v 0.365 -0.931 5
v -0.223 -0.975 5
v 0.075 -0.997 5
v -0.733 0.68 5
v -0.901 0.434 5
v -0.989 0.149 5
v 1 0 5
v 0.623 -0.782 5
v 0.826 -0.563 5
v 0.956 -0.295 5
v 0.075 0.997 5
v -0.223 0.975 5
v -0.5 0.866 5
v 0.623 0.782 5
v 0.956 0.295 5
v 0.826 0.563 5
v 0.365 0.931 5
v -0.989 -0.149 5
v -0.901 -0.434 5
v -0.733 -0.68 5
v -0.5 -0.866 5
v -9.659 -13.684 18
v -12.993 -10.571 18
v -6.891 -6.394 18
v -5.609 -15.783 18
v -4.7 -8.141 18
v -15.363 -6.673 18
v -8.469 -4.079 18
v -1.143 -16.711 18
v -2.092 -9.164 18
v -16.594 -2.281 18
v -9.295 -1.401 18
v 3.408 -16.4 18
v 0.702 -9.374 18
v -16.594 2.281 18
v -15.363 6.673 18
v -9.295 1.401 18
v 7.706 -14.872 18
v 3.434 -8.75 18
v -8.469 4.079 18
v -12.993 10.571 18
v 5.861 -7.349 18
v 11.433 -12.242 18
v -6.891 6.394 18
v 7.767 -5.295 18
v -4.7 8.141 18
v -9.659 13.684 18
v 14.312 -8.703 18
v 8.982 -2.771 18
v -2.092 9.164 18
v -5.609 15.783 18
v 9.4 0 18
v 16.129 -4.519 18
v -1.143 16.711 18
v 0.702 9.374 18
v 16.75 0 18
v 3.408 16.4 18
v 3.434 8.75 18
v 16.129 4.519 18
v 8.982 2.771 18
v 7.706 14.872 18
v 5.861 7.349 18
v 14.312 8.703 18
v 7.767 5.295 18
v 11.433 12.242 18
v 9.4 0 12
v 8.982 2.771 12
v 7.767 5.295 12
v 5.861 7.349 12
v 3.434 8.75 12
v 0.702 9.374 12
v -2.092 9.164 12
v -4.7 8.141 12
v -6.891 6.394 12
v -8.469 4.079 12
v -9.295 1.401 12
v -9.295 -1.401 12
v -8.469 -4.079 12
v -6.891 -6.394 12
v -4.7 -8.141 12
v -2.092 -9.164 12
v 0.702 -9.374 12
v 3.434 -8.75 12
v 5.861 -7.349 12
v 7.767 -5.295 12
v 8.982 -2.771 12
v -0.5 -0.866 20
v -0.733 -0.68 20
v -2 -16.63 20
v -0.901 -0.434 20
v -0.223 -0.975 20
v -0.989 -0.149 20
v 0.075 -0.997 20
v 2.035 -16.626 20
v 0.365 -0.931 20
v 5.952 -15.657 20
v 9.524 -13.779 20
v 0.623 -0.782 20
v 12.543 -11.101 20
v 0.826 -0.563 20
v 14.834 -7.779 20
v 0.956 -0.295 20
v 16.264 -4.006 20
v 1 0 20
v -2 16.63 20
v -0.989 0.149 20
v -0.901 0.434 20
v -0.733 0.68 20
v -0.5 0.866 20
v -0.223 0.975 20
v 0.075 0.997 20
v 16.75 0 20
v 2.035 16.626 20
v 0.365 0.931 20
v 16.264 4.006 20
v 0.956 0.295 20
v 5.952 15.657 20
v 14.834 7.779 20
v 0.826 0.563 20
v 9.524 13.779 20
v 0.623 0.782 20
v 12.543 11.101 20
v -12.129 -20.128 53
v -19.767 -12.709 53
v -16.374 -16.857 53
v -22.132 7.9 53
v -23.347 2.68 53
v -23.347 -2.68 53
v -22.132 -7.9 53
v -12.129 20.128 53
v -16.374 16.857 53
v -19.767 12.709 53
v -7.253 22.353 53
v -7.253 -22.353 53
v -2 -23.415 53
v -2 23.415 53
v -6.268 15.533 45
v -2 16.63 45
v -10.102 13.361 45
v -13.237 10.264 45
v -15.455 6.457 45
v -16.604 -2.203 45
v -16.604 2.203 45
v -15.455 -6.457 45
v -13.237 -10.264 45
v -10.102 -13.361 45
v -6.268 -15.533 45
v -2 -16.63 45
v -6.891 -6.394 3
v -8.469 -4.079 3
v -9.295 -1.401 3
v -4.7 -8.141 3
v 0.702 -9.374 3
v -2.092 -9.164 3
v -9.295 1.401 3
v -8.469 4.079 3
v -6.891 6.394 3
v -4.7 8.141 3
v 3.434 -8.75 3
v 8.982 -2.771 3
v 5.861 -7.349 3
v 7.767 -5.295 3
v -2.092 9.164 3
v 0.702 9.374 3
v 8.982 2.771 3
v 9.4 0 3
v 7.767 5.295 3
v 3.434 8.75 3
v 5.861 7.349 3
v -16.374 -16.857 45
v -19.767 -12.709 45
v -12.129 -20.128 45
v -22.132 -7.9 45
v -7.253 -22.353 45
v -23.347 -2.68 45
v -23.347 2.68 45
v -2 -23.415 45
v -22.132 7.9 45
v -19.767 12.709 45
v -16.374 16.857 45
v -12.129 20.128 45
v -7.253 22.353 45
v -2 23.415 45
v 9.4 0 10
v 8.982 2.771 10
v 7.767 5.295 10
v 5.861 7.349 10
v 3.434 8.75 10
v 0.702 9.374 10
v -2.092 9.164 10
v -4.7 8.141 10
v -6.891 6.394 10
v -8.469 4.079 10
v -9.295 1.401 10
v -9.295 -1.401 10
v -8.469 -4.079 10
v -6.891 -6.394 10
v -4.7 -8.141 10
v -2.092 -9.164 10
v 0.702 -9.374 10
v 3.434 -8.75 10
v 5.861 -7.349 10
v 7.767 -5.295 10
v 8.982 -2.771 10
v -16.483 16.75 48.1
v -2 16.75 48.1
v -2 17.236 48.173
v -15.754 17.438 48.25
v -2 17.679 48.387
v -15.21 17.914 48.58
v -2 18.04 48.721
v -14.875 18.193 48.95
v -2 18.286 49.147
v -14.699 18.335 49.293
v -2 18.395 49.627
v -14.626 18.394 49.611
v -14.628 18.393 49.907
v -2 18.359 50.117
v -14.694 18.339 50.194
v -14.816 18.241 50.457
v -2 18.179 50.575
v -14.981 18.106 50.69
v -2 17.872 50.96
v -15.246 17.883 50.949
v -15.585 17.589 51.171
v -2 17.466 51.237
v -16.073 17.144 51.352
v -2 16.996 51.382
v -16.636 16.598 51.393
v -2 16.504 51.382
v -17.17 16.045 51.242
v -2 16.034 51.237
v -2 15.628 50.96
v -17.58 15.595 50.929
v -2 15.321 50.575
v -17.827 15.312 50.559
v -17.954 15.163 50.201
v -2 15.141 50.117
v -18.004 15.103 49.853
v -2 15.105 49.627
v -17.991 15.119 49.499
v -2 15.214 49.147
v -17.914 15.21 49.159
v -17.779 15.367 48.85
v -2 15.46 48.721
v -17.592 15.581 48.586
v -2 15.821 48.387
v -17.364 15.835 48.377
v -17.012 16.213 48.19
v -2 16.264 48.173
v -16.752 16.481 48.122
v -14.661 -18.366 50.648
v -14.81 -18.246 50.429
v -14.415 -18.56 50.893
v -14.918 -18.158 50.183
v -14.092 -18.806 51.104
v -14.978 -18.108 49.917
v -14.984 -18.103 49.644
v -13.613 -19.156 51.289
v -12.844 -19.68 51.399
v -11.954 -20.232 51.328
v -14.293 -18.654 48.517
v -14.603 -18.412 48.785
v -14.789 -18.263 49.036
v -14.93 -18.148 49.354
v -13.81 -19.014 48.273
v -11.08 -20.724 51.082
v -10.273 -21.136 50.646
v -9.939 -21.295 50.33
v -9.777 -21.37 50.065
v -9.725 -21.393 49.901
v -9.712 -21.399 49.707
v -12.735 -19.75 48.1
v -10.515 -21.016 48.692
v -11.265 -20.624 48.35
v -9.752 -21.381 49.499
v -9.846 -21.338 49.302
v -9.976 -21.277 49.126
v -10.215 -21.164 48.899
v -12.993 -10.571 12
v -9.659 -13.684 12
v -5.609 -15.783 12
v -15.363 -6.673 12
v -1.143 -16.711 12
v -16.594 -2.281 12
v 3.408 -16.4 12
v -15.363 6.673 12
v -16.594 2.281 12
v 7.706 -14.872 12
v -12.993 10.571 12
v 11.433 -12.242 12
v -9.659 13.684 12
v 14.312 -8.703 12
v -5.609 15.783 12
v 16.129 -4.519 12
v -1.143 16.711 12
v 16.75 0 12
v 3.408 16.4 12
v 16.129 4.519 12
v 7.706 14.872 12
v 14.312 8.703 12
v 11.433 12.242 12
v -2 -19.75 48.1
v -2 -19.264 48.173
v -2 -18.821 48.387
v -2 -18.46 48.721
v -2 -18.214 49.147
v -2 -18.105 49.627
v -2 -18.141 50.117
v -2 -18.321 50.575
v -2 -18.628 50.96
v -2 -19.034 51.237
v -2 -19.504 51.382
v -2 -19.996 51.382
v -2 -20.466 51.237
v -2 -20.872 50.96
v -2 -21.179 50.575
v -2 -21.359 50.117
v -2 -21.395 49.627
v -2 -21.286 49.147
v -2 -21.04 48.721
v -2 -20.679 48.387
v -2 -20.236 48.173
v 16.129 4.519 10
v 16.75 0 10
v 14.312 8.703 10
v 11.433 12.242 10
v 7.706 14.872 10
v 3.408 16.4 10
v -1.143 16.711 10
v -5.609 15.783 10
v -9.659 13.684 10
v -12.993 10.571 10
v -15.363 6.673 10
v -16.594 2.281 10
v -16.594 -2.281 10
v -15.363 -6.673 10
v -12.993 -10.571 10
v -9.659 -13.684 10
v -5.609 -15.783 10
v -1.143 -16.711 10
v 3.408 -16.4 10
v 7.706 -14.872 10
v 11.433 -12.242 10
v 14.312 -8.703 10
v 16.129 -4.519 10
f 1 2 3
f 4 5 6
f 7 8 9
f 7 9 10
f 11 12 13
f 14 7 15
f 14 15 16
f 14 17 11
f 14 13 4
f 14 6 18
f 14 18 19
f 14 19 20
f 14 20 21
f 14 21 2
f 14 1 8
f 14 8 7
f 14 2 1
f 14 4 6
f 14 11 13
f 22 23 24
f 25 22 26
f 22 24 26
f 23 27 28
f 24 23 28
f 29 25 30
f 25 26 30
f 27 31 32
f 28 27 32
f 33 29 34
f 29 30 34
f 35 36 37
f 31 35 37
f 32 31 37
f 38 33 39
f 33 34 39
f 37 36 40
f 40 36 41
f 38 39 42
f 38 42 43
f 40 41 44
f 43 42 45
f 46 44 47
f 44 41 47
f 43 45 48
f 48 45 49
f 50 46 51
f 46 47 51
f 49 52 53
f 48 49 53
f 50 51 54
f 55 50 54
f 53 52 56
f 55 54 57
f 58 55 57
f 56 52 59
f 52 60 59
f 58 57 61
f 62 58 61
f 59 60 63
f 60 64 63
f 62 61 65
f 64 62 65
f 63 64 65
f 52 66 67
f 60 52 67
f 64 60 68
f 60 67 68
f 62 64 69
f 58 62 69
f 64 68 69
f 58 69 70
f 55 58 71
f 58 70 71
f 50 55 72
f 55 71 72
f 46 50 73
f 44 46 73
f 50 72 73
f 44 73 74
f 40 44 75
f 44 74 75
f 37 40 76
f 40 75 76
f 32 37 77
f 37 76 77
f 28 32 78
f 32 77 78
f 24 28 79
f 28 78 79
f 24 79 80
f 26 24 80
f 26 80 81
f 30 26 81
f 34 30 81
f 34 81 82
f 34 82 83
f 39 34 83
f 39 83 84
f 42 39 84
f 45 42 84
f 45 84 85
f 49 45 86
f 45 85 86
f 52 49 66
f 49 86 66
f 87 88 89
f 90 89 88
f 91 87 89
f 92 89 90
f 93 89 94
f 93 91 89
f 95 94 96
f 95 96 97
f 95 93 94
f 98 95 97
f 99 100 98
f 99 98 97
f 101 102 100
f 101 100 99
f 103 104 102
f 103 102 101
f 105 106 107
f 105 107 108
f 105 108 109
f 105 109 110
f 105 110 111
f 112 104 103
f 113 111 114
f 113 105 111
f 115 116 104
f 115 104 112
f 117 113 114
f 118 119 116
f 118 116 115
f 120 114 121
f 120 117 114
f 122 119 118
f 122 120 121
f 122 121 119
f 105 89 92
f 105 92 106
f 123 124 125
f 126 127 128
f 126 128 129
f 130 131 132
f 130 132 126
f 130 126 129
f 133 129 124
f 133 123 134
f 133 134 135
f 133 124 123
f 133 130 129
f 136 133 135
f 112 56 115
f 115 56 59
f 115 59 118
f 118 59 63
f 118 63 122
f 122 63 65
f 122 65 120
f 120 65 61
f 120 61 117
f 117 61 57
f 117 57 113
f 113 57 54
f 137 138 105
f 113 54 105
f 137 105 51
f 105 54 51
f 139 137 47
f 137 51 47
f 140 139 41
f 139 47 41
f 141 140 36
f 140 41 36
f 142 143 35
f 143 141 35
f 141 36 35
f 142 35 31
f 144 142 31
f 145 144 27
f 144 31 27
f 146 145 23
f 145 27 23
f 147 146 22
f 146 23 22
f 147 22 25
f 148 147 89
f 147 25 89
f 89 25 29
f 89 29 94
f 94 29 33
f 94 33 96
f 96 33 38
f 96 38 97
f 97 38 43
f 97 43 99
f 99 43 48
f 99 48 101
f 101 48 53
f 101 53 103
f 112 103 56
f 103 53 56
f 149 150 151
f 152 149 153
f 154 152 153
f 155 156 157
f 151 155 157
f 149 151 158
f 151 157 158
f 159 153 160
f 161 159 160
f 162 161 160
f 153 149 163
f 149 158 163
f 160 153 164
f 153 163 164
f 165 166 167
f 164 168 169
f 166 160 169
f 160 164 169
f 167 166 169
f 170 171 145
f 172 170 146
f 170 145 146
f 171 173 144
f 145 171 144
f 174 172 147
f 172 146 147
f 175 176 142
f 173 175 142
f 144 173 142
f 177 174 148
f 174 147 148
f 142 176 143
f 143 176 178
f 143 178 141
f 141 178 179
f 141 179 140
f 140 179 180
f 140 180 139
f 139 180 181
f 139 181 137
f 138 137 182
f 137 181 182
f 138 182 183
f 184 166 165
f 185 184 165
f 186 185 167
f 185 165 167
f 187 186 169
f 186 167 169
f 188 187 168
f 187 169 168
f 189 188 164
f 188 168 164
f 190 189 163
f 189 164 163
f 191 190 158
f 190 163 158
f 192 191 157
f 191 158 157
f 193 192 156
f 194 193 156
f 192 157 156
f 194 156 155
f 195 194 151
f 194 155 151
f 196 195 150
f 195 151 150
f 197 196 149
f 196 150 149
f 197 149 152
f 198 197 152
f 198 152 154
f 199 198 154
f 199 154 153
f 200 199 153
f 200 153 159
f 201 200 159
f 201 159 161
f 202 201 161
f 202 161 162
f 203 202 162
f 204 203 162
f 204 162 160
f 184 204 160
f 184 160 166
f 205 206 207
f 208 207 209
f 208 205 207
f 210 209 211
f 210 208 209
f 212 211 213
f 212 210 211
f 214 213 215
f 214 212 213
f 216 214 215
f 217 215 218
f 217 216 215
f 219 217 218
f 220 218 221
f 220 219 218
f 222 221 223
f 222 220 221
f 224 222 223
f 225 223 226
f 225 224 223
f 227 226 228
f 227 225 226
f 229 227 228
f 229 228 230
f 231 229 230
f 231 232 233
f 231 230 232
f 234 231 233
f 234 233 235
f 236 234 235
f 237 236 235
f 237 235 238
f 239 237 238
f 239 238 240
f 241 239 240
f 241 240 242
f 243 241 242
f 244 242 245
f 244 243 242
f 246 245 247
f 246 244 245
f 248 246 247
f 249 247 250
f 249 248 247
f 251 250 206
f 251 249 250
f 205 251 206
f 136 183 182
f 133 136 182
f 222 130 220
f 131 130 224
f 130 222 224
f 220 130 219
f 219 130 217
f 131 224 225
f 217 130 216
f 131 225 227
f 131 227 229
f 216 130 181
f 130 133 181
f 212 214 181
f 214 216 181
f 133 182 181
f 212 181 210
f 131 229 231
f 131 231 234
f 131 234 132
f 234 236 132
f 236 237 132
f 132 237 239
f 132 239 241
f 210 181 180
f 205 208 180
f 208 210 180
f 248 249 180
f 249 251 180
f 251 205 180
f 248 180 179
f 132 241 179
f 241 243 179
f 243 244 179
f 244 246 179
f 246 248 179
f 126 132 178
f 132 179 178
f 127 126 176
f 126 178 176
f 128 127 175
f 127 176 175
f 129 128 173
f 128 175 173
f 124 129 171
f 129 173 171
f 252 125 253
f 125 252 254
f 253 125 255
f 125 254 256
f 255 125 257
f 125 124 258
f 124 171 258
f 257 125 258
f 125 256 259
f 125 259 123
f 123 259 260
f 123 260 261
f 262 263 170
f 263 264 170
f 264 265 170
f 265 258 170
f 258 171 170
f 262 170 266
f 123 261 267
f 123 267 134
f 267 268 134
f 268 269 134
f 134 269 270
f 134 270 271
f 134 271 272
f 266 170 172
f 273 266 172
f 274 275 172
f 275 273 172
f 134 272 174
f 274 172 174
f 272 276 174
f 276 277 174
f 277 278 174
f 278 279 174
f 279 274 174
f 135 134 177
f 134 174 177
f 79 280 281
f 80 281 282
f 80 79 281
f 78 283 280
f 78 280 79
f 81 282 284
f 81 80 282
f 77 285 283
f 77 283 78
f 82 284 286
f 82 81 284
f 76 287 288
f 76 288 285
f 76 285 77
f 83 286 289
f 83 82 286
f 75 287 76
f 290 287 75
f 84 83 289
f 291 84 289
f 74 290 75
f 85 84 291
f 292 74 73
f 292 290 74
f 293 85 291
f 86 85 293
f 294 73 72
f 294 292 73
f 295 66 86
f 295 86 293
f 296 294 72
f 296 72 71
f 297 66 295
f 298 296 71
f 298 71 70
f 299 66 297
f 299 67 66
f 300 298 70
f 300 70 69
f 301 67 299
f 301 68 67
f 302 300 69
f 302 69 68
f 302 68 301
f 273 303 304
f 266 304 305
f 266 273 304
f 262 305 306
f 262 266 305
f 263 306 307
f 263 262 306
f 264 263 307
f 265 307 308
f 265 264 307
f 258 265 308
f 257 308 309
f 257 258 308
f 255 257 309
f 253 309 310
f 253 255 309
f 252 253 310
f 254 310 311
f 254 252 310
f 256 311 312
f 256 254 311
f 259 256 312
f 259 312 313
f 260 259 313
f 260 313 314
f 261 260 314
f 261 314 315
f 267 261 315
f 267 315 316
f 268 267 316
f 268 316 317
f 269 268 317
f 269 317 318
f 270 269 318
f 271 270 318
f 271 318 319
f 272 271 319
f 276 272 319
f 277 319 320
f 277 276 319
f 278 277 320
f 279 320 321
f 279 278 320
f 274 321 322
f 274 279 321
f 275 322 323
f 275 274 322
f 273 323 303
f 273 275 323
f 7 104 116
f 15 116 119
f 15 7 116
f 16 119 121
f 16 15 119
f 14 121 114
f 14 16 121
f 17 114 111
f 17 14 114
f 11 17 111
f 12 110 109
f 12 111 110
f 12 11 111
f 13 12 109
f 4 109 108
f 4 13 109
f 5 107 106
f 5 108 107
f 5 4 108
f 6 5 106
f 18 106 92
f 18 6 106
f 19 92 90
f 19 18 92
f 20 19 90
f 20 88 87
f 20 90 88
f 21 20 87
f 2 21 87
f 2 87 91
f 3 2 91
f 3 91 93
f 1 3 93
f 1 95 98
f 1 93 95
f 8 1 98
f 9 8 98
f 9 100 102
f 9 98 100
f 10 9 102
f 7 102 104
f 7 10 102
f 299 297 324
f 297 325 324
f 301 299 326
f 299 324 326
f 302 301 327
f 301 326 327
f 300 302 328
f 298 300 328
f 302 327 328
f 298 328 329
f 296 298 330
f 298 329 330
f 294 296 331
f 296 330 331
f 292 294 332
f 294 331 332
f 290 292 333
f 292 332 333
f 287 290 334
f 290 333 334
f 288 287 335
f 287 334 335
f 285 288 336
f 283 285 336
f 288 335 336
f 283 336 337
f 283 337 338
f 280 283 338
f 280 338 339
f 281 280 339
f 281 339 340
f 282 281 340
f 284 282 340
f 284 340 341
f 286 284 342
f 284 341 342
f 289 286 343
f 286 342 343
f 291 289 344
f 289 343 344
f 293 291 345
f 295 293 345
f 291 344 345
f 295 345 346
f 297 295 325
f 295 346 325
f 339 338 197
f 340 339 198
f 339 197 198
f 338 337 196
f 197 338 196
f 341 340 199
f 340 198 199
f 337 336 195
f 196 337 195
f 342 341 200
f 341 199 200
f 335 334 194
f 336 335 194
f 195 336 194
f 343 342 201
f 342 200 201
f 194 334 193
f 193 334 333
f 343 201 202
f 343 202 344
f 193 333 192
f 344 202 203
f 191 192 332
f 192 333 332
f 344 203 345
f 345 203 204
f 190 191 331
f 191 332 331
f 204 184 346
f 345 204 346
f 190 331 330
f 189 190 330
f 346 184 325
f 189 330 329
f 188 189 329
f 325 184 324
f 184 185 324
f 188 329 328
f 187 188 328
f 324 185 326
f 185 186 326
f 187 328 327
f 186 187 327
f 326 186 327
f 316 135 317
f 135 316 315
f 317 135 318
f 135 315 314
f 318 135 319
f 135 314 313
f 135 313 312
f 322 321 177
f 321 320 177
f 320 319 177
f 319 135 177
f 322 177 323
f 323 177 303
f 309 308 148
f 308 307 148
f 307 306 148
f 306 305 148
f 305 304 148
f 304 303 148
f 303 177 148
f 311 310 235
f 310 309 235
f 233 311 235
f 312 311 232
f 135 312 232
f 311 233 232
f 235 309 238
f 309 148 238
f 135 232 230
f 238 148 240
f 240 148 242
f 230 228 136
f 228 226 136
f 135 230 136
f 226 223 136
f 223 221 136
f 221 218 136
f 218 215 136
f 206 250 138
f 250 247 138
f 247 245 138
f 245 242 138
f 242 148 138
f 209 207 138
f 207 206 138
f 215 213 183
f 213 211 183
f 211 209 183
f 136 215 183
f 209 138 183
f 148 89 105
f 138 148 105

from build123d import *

# Parameters (mm, degrees)
CYLINDER013_R     = 9.4
CYLINDER013_DEPTH = 6
CYLINDER014_R     = 16.75
CYLINDER014_DEPTH = 6
CYLINDER011_R     = 1
CYLINDER011_DEPTH = 100
CYLINDER006_R     = 9.4
CYLINDER006_DEPTH = 7
CYLINDER010_R     = 1.65
CYLINDER010_DEPTH = 100
CYLINDER009_R     = 1.65
CYLINDER009_DEPTH = 100
BOX003_W          = 50
BOX003_H          = 100
BOX003_DEPTH      = 100
CYLINDER012_R     = 23.5
CYLINDER012_DEPTH = 8
CYLINDER008_R     = 16.75
CYLINDER008_DEPTH = 43
CYLINDER007_R     = 16.75
CYLINDER007_DEPTH = 10


with BuildPart() as zylinder013:
    # Cylinder013 → Cylinder013 (new body)
    with BuildSketch(Plane.XY.offset(12)):
        Circle(CYLINDER013_R)
    extrude(amount=CYLINDER013_DEPTH)


with BuildPart() as cut006:
    # Cylinder014 → Cylinder014 (new body)
    with BuildSketch(Plane.XY.offset(12)):
        Circle(CYLINDER014_R)
    extrude(amount=CYLINDER014_DEPTH)

    # Cut006: cut Zylinder013
    add(zylinder013.part, mode=Mode.SUBTRACT)


with BuildPart() as zylinder011:
    # Cylinder011 → Cylinder011 (new body)
    with BuildSketch(Plane.XY.offset(5)):
        Circle(CYLINDER011_R)
    extrude(amount=CYLINDER011_DEPTH)


with BuildPart() as zylinder006:
    # Cylinder006 → Cylinder006 (new body)
    with BuildSketch(Plane.XY.offset(3)):
        Circle(CYLINDER006_R)
    extrude(amount=CYLINDER006_DEPTH)


with BuildPart() as zylinder010:
    # Cylinder010 → Cylinder010 (new body)
    with BuildSketch(Plane(origin=(-31, 16.75, 49.75), x_dir=(0, 0, -1), z_dir=(1, 0, 0))):
        Circle(CYLINDER010_R)
    extrude(amount=CYLINDER010_DEPTH)


with BuildPart() as compound003:
    # Cylinder009 → Cylinder009 (new body)
    with BuildSketch(Plane(origin=(-31, -19.75, 49.75), x_dir=(0, 0, -1), z_dir=(1, 0, 0))):
        Circle(CYLINDER009_R)
    extrude(amount=CYLINDER009_DEPTH)

    # Compound003: union Zylinder010
    add(zylinder010.part)


with BuildPart() as w_rfel003:
    # Box003 → Box003 (new body)
    with BuildSketch(Plane(origin=(-2, -25, 0), x_dir=(1, 0, 0), z_dir=(0, 0, 1))):
        with Locations((25, 50)):
            Rectangle(BOX003_W, BOX003_H)
    extrude(amount=BOX003_DEPTH)


with BuildPart() as zylinder012:
    # Cylinder012 → Cylinder012 (new body)
    with BuildSketch(Plane.XY.offset(45)):
        Circle(CYLINDER012_R)
    extrude(amount=CYLINDER012_DEPTH)


with BuildPart() as cut004:
    # Cylinder008 → Cylinder008 (new body)
    with BuildSketch(Plane.XY.offset(10)):
        Circle(CYLINDER008_R)
    extrude(amount=CYLINDER008_DEPTH)

    # Fusion: union Zylinder012
    add(zylinder012.part)

    # Cut003: cut Würfel003
    add(w_rfel003.part, mode=Mode.SUBTRACT)

    # Cut004: cut Compound003
    add(compound003.part, mode=Mode.SUBTRACT)


with BuildPart() as cut007:
    # Cylinder007 → Cylinder007 (new body)
    with BuildSketch(Plane.XY.offset(10)):
        Circle(CYLINDER007_R)
    extrude(amount=CYLINDER007_DEPTH)

    # Fusion001: union Zylinder006, Cut004
    add(zylinder006.part)
    add(cut004.part)

    # Cut005: cut Zylinder011
    add(zylinder011.part, mode=Mode.SUBTRACT)

    # Cut007: cut Cut006
    add(cut006.part, mode=Mode.SUBTRACT)


solid = cut007.part
